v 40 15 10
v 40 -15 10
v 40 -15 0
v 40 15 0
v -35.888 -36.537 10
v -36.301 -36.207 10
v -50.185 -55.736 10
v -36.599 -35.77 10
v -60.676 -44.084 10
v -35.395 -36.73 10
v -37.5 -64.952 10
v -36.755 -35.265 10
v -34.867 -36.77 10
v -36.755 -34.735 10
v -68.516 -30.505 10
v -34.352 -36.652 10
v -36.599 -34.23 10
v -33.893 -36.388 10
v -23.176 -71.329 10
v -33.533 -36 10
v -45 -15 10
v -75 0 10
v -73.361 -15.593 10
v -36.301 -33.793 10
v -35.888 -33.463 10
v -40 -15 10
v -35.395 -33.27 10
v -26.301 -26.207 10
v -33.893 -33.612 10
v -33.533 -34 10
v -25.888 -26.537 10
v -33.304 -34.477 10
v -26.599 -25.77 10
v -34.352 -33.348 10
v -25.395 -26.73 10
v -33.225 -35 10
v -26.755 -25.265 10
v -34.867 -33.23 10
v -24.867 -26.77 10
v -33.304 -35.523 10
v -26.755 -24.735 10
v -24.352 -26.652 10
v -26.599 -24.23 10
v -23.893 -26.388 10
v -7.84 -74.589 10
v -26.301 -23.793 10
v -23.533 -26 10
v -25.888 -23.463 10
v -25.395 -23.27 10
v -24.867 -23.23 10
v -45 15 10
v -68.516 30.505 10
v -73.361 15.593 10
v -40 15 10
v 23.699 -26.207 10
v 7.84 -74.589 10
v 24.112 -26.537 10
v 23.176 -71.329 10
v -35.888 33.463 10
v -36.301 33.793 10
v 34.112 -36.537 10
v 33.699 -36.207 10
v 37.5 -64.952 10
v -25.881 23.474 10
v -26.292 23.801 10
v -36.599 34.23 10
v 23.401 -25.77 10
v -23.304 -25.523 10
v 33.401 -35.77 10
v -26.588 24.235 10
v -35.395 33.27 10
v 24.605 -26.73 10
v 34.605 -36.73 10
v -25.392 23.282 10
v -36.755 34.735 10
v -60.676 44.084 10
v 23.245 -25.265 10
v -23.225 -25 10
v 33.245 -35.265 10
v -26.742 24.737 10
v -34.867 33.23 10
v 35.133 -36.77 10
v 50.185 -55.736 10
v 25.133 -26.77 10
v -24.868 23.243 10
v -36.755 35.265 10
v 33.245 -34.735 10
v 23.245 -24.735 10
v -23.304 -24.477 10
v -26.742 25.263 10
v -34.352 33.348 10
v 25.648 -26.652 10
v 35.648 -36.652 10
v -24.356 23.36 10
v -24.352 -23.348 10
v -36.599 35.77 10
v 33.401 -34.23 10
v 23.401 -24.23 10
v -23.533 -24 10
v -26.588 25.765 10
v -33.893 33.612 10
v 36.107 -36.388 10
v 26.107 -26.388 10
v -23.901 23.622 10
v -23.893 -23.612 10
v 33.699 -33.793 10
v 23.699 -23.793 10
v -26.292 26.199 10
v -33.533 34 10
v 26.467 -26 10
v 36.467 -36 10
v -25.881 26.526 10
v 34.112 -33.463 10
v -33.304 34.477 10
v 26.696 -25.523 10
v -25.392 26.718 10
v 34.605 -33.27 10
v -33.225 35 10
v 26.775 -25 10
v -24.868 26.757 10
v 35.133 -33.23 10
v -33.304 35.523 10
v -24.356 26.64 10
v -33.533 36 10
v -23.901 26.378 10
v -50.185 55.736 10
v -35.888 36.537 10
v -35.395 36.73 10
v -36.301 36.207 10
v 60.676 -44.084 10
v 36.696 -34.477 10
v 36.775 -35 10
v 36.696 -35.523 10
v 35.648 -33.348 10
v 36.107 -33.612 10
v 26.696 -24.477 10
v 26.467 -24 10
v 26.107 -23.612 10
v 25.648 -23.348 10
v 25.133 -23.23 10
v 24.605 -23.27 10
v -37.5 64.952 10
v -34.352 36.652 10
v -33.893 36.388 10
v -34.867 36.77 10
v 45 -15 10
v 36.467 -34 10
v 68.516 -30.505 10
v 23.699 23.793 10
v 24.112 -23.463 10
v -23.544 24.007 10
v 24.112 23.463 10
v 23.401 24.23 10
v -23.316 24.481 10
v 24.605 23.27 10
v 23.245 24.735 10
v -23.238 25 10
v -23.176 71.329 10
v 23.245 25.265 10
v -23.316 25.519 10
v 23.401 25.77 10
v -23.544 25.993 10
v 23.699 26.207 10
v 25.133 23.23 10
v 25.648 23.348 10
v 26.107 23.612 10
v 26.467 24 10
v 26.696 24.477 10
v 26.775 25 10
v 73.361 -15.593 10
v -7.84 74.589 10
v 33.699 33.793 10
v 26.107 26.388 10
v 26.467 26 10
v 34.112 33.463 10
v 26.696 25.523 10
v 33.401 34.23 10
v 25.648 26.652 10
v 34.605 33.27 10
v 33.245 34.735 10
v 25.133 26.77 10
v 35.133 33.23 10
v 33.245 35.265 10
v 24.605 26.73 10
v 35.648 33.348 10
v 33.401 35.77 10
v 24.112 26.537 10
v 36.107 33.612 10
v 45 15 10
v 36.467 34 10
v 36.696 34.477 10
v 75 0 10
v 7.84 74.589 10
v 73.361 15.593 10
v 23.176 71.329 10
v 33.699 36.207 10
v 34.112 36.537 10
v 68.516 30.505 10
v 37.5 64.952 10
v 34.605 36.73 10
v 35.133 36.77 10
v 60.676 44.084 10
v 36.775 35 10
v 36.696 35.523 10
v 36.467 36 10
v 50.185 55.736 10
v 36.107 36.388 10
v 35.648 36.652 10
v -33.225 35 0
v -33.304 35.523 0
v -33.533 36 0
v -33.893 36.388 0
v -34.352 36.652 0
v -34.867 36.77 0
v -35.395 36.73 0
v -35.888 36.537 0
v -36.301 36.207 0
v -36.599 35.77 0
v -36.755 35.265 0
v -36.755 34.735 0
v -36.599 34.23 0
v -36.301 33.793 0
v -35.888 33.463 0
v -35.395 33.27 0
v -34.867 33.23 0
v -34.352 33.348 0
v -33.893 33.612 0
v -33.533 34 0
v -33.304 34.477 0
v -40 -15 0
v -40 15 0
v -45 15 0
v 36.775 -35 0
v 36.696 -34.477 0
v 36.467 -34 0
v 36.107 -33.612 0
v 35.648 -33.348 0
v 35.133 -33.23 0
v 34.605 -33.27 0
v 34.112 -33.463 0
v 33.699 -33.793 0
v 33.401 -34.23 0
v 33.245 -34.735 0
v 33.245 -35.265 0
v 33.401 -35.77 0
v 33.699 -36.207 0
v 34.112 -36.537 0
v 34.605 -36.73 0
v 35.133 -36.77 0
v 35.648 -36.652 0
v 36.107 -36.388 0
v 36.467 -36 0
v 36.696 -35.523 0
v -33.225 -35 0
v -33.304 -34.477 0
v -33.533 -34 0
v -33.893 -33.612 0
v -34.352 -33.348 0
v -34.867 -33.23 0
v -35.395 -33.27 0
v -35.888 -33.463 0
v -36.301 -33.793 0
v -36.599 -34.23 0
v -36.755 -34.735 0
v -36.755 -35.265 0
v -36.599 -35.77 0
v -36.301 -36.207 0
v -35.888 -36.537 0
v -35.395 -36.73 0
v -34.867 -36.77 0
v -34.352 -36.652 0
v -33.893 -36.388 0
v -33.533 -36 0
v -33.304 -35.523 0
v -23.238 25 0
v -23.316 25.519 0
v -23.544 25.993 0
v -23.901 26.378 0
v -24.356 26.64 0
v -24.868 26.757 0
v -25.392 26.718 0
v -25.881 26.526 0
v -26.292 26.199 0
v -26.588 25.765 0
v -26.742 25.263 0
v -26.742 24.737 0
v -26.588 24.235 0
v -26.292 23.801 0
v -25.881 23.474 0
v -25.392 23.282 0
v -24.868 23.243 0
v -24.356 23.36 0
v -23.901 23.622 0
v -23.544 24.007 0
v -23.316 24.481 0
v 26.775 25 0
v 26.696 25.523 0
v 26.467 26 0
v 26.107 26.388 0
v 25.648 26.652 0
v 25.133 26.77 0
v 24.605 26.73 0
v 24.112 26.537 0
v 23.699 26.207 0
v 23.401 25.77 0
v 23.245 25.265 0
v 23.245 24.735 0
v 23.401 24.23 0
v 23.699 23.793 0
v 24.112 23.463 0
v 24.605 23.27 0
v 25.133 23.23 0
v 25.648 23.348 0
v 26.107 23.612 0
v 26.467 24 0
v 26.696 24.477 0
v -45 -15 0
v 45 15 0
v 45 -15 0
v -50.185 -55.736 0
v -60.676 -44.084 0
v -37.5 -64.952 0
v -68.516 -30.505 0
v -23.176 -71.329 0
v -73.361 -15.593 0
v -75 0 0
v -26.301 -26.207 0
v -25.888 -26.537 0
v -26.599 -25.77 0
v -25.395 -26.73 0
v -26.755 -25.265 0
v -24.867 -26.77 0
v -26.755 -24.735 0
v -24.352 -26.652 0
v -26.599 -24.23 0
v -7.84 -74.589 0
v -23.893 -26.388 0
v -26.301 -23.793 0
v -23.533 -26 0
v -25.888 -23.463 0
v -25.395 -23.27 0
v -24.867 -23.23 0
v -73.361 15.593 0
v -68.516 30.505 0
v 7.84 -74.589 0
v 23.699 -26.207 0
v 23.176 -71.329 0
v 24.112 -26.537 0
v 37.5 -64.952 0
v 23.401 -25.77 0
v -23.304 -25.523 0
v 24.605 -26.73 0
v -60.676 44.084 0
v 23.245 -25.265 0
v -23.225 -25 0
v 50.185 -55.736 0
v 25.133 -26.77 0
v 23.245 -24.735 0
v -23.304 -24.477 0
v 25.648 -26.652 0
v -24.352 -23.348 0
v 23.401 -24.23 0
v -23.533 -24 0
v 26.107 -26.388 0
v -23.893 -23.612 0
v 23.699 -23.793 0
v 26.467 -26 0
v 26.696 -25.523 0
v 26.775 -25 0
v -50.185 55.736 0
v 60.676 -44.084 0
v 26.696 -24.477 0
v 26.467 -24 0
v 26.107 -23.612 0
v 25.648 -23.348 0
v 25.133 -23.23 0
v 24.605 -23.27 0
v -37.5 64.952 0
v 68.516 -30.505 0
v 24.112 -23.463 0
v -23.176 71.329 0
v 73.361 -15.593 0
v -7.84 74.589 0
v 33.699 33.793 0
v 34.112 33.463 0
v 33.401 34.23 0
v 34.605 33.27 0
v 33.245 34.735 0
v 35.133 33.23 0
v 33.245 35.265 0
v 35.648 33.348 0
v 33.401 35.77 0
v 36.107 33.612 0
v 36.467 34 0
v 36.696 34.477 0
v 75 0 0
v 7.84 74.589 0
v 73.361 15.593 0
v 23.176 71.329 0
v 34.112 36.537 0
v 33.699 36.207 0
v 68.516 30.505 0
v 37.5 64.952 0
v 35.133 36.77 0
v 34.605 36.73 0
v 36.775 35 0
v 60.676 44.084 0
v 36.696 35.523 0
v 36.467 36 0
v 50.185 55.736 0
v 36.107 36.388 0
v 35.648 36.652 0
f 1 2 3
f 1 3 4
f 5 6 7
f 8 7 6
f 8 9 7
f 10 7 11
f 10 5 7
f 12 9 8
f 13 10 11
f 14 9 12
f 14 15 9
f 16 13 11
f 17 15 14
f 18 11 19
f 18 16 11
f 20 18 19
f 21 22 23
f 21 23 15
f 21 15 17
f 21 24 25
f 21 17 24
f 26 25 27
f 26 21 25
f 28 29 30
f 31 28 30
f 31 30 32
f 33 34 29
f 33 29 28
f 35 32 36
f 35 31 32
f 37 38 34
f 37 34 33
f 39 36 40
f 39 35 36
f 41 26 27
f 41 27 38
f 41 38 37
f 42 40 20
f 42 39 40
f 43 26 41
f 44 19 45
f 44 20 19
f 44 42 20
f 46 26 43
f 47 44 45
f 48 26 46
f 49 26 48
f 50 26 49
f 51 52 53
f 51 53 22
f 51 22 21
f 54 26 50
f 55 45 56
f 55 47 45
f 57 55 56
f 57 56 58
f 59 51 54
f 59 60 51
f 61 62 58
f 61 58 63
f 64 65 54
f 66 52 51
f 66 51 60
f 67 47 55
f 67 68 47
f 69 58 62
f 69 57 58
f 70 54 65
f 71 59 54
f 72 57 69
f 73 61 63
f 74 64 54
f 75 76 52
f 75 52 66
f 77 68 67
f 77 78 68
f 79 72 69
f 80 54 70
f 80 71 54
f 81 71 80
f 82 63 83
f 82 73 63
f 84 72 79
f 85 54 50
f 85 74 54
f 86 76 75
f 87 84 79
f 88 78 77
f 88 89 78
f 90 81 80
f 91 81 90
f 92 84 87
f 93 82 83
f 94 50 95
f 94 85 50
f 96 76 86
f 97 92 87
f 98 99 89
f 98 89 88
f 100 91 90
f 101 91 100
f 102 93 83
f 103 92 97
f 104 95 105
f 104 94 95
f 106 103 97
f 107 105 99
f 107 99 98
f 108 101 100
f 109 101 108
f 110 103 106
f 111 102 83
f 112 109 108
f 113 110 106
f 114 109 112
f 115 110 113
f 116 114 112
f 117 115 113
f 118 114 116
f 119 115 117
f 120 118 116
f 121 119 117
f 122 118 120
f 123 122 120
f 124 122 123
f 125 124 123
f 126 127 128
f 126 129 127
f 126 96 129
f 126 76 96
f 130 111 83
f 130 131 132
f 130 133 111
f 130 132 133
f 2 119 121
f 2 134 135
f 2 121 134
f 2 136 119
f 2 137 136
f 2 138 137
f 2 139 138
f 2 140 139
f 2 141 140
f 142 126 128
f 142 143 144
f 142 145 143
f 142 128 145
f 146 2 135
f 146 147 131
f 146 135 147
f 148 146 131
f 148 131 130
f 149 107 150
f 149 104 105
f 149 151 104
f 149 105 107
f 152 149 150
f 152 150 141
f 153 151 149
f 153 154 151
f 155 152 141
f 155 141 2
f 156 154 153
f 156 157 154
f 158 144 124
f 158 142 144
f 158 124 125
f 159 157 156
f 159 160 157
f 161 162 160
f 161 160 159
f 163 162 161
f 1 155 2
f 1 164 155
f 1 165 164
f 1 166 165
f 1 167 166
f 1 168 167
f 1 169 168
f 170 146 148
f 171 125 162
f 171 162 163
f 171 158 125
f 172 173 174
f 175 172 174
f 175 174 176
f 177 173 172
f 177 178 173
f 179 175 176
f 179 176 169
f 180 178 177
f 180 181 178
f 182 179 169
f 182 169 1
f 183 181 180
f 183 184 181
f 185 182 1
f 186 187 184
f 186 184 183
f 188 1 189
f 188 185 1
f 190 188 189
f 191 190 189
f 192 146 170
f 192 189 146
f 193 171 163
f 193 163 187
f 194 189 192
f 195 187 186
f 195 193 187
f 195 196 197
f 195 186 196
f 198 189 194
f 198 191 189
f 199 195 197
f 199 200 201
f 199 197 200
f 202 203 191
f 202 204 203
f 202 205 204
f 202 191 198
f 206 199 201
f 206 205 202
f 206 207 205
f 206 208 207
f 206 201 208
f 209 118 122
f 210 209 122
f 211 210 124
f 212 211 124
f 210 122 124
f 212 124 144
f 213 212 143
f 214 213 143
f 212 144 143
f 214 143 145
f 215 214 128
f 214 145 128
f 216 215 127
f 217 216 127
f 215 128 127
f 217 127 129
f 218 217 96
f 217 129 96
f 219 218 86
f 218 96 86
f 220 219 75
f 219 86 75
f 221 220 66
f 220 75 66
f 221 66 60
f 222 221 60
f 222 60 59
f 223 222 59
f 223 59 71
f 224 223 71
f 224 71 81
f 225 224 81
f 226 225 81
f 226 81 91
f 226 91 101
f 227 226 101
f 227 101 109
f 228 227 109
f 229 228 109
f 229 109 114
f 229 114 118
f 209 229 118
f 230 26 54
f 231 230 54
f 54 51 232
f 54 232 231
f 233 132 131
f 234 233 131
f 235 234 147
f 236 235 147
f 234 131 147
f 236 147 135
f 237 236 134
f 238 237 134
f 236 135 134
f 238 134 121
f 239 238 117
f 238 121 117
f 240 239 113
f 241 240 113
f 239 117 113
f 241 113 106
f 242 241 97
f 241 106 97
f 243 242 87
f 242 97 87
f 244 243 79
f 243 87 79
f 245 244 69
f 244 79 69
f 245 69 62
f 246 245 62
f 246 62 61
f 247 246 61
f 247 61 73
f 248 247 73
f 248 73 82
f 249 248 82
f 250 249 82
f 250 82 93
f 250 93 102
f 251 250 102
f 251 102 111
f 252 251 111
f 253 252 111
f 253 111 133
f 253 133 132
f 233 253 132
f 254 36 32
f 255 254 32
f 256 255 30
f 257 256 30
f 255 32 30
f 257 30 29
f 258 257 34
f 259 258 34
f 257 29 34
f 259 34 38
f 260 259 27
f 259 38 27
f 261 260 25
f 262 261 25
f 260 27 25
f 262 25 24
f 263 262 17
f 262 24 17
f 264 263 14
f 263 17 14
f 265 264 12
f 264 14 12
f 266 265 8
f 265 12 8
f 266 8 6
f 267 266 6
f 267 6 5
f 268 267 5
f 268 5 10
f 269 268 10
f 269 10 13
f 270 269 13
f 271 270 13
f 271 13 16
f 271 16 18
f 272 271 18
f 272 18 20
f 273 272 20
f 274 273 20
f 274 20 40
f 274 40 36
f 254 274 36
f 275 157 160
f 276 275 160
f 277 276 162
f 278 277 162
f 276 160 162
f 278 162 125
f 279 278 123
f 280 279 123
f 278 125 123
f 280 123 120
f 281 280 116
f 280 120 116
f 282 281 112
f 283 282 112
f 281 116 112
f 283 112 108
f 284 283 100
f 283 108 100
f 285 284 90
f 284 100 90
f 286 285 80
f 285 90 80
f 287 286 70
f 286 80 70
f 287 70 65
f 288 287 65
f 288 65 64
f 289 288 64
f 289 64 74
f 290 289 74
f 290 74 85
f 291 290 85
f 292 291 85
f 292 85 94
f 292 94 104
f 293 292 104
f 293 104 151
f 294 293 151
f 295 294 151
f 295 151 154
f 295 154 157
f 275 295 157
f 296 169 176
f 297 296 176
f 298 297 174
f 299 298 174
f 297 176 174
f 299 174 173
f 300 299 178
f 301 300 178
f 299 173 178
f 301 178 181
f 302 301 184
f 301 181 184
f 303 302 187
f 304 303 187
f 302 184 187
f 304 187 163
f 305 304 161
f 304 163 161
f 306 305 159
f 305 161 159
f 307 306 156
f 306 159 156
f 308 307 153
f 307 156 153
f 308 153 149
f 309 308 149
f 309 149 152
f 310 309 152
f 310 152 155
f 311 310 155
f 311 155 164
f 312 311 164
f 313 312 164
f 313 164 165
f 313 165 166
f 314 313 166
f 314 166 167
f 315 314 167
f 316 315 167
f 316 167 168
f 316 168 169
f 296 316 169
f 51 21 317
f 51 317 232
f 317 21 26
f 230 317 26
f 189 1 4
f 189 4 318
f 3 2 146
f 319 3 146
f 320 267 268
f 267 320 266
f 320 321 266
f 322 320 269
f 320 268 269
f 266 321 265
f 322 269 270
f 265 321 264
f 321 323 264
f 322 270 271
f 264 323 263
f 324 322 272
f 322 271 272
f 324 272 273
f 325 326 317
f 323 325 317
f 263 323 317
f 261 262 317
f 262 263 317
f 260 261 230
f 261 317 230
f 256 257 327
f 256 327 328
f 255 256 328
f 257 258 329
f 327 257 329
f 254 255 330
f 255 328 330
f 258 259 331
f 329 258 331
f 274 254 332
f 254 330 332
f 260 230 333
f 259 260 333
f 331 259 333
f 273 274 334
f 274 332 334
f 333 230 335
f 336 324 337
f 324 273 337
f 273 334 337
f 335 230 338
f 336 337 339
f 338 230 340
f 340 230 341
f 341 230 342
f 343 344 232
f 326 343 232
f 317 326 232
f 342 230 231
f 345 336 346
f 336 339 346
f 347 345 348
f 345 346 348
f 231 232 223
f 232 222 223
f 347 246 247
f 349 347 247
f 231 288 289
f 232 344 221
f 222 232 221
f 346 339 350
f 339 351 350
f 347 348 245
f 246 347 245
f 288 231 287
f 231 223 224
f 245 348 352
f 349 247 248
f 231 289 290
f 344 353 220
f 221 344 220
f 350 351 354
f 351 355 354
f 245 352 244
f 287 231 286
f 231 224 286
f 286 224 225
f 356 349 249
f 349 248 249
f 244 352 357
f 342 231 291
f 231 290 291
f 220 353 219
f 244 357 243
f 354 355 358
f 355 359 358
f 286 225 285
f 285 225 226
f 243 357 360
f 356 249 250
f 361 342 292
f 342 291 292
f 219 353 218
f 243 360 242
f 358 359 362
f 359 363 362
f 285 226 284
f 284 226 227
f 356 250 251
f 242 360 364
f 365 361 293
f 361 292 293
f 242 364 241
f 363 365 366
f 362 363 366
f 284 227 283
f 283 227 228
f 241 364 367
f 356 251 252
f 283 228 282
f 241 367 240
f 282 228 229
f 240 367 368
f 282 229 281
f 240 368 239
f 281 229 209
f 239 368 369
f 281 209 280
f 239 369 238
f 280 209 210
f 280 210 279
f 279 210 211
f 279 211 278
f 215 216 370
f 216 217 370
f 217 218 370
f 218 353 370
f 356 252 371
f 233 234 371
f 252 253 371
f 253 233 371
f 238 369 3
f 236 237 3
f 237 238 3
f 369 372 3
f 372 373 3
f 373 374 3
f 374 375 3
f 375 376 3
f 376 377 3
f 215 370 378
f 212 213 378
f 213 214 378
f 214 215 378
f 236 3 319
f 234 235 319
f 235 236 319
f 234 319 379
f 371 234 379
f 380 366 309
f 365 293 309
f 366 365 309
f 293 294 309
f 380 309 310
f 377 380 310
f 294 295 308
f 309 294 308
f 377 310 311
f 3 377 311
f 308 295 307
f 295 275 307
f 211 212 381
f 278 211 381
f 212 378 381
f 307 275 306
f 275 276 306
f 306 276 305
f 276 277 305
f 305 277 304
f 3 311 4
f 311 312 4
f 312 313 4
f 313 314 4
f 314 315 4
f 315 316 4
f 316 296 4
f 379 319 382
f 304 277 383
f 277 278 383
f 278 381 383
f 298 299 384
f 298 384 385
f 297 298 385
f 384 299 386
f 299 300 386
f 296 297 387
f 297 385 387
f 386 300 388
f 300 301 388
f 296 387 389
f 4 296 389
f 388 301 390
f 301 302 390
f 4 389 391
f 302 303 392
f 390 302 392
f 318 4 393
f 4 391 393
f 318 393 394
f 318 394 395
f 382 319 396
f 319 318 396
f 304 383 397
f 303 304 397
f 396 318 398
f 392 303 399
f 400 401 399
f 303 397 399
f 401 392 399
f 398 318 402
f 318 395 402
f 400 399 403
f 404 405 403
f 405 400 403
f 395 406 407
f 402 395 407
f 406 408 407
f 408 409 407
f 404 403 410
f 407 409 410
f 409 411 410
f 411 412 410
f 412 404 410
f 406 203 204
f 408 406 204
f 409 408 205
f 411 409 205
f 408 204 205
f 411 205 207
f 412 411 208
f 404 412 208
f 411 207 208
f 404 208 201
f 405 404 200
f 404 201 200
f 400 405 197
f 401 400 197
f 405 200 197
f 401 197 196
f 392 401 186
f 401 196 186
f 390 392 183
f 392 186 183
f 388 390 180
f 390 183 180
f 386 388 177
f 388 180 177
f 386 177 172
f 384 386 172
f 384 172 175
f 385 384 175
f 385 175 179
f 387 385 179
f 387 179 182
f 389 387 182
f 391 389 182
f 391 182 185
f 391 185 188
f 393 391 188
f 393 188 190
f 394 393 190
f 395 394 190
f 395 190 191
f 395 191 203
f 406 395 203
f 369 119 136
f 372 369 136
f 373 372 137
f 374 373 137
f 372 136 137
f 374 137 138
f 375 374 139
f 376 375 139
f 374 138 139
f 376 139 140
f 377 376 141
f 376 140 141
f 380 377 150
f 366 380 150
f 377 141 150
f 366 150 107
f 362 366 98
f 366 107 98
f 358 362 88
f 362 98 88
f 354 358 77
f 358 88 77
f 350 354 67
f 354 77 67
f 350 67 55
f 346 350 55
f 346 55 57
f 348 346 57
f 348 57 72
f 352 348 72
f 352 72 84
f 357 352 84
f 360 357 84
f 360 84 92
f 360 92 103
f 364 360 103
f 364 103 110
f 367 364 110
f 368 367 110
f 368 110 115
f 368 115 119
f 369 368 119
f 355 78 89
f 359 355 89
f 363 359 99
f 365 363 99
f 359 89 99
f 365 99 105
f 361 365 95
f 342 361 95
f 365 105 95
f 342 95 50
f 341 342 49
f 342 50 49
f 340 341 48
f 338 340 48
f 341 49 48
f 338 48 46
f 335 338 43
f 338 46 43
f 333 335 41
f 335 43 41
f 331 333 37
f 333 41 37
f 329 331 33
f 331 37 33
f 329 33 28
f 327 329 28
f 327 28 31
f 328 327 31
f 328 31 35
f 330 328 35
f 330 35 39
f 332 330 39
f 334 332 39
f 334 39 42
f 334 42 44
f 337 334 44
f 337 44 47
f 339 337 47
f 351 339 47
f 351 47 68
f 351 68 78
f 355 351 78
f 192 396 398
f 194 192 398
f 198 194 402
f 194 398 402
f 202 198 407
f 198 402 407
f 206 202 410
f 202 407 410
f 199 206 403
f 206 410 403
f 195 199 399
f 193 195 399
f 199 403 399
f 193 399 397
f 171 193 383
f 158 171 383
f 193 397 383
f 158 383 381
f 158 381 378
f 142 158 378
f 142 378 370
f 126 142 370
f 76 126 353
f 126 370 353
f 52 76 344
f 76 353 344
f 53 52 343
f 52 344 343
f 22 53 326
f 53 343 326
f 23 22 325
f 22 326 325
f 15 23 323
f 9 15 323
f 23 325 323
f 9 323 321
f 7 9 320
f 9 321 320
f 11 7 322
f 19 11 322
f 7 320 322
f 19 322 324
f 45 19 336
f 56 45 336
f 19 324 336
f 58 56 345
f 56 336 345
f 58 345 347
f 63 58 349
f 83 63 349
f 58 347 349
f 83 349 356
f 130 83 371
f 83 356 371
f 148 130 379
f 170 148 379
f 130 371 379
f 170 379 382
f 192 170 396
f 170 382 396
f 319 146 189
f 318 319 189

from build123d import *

# Parameters (mm, degrees)
F0_R     = 75
F1_DEPTH = 10
F2_R     = 1.775
F2_R_2   = 1.762154
F3_DEPTH = 25
F4_W     = 5
F4_H     = 30
F5_DEPTH = 25


with BuildPart() as f1:
    # F0 (on Top) → F1 (new body)
    with BuildSketch(Plane.XY):
        Circle(F0_R)
    extrude(amount=F1_DEPTH)

    # F2 (on face) → F3 (cut)
    with BuildSketch(Plane.XY.offset(10)):
        with Locations((-35, 35)):
            Circle(F2_R)
        with Locations((-25, 25)):
            Circle(F2_R_2)
        with Locations((25, 25)):
            Circle(F2_R)
        with Locations((35, 35)):
            Circle(F2_R)
        with Locations((25, -25)):
            Circle(F2_R)
        with Locations((35, -35)):
            Circle(F2_R)
        with Locations((-25, -25)):
            Circle(F2_R)
        with Locations((-35, -35)):
            Circle(F2_R)
    extrude(amount=-F3_DEPTH, mode=Mode.SUBTRACT)

    # F4 (on face) → F5 (cut)
    with BuildSketch(Plane.XY.offset(10)):
        with Locations((-42.5, 0)):
            Rectangle(F4_W, F4_H)
        with Locations((42.5, 0)):
            Rectangle(F4_W, F4_H)
    extrude(amount=-F5_DEPTH, mode=Mode.SUBTRACT)


solid = f1.part
